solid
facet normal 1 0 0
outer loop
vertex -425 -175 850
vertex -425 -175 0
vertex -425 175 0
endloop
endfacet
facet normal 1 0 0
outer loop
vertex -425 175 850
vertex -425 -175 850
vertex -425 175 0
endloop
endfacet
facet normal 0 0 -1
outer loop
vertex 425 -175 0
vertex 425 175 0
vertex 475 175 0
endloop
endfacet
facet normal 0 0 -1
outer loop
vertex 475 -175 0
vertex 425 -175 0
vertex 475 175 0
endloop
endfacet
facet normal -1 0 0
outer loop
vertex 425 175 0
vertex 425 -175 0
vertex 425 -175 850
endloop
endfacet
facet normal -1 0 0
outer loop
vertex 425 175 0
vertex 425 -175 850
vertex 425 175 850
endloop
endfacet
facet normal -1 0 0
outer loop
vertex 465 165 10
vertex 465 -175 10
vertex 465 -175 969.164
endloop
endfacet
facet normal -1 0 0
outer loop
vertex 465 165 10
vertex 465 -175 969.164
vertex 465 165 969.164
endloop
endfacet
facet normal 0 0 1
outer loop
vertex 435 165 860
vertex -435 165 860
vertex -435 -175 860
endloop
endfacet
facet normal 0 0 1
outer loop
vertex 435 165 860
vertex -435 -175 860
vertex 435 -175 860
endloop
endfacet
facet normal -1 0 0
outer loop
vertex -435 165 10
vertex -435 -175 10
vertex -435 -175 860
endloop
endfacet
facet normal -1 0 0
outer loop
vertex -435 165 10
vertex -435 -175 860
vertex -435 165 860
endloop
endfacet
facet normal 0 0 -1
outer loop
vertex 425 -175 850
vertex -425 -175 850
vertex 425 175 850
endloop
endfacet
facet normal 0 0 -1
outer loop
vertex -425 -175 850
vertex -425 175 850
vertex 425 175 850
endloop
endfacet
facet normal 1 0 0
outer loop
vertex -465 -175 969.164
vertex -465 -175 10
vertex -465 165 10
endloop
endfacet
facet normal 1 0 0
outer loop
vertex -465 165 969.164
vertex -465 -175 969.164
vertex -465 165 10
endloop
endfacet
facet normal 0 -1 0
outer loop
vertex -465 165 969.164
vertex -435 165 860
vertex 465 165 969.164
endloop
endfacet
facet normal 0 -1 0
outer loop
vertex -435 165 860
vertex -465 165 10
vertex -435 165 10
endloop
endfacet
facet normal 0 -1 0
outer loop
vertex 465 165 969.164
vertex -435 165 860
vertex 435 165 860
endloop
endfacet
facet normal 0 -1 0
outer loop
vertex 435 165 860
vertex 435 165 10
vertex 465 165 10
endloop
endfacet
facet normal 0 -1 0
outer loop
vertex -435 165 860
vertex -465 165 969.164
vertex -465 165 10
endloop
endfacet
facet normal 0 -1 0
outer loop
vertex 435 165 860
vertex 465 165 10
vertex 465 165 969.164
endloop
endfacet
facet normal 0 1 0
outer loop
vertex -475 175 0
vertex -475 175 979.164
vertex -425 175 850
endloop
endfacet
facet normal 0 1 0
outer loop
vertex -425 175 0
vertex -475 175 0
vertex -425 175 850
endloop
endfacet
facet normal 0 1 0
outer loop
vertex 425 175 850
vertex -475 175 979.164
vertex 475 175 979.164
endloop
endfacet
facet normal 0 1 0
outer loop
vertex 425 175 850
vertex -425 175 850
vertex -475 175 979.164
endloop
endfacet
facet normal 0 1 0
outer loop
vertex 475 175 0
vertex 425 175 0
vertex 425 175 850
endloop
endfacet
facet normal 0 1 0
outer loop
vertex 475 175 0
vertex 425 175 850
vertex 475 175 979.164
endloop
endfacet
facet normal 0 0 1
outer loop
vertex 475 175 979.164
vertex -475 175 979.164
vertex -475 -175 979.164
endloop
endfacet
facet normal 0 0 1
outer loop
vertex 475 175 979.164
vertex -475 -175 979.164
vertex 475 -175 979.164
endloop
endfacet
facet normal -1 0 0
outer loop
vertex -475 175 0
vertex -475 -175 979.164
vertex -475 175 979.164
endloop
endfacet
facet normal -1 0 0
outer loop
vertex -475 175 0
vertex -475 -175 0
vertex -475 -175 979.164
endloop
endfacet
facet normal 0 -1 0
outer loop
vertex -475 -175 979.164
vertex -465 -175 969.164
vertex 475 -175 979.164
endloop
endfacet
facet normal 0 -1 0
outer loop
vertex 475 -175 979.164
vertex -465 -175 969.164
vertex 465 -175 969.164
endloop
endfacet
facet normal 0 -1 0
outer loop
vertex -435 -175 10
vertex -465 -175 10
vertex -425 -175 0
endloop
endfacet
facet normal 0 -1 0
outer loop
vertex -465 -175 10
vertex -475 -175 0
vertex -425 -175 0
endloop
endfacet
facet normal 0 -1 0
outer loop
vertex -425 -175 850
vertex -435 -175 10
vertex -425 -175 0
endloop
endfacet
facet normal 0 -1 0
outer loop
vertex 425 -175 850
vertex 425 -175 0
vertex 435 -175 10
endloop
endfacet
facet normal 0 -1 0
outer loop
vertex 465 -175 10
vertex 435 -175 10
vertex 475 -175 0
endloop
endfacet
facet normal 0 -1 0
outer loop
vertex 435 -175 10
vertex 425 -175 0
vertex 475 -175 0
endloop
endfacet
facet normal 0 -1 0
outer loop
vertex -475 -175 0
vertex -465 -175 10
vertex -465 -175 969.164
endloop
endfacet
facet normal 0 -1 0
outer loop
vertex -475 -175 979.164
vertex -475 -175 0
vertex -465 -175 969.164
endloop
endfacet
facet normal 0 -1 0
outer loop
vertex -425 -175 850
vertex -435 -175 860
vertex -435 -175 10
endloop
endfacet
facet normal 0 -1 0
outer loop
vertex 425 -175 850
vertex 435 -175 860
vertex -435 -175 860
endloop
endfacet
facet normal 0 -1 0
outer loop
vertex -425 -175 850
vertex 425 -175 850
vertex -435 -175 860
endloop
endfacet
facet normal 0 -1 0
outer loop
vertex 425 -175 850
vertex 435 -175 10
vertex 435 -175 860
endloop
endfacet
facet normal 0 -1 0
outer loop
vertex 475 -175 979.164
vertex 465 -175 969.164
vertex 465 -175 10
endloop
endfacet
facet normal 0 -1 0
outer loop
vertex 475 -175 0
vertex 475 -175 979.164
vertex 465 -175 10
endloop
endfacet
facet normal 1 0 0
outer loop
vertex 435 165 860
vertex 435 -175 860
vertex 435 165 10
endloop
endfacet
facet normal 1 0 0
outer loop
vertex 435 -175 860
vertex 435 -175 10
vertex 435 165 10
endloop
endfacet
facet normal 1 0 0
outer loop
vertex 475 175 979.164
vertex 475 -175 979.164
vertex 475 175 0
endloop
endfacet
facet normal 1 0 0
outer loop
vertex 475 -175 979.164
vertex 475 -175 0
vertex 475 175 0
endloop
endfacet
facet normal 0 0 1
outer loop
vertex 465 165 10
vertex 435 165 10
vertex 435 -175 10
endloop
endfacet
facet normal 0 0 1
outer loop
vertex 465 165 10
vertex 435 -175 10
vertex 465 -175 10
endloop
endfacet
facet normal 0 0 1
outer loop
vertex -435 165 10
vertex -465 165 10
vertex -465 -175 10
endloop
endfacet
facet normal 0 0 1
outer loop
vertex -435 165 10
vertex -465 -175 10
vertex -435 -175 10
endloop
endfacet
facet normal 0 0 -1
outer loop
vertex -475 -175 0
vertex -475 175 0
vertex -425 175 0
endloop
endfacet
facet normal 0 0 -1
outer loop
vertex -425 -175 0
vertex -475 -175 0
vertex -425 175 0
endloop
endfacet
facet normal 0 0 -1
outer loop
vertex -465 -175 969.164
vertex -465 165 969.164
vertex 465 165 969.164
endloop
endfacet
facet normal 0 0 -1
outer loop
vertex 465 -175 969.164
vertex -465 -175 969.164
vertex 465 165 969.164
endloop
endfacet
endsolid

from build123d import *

# Parameters (mm, degrees)
F0_W     = 950
F0_H     = 350
F1_DEPTH = 900
F2_T     = -50
F3_W     = 950
F3_H     = 350
F4_DEPTH = 79.1636947542
F5_T     = -10


with BuildPart() as f1:
    # F0 (on Top) → F1 (new body)
    with BuildSketch(Plane.XY):
        Rectangle(F0_W, F0_H)
    extrude(amount=F1_DEPTH)

    # F2
    f2_openings = [f1.faces().sort_by_distance(p)[0] for p in [
        (0, -175, 450),
        (0, 0, 0),
        (0, 175, 450),
    ]]
    offset(amount=F2_T, openings=f2_openings)

    # F3 (on face) → F4 (join)
    with BuildSketch(Plane.XY.offset(900)):
        Rectangle(F3_W, F3_H)
    extrude(amount=F4_DEPTH)

    # F5
    f5_openings = [f1.faces().sort_by_distance(p)[0] for p in [
        (-450, -175, 13.642806),
    ]]
    offset(amount=F5_T, openings=f5_openings, kind=Kind.INTERSECTION)


solid = f1.part
